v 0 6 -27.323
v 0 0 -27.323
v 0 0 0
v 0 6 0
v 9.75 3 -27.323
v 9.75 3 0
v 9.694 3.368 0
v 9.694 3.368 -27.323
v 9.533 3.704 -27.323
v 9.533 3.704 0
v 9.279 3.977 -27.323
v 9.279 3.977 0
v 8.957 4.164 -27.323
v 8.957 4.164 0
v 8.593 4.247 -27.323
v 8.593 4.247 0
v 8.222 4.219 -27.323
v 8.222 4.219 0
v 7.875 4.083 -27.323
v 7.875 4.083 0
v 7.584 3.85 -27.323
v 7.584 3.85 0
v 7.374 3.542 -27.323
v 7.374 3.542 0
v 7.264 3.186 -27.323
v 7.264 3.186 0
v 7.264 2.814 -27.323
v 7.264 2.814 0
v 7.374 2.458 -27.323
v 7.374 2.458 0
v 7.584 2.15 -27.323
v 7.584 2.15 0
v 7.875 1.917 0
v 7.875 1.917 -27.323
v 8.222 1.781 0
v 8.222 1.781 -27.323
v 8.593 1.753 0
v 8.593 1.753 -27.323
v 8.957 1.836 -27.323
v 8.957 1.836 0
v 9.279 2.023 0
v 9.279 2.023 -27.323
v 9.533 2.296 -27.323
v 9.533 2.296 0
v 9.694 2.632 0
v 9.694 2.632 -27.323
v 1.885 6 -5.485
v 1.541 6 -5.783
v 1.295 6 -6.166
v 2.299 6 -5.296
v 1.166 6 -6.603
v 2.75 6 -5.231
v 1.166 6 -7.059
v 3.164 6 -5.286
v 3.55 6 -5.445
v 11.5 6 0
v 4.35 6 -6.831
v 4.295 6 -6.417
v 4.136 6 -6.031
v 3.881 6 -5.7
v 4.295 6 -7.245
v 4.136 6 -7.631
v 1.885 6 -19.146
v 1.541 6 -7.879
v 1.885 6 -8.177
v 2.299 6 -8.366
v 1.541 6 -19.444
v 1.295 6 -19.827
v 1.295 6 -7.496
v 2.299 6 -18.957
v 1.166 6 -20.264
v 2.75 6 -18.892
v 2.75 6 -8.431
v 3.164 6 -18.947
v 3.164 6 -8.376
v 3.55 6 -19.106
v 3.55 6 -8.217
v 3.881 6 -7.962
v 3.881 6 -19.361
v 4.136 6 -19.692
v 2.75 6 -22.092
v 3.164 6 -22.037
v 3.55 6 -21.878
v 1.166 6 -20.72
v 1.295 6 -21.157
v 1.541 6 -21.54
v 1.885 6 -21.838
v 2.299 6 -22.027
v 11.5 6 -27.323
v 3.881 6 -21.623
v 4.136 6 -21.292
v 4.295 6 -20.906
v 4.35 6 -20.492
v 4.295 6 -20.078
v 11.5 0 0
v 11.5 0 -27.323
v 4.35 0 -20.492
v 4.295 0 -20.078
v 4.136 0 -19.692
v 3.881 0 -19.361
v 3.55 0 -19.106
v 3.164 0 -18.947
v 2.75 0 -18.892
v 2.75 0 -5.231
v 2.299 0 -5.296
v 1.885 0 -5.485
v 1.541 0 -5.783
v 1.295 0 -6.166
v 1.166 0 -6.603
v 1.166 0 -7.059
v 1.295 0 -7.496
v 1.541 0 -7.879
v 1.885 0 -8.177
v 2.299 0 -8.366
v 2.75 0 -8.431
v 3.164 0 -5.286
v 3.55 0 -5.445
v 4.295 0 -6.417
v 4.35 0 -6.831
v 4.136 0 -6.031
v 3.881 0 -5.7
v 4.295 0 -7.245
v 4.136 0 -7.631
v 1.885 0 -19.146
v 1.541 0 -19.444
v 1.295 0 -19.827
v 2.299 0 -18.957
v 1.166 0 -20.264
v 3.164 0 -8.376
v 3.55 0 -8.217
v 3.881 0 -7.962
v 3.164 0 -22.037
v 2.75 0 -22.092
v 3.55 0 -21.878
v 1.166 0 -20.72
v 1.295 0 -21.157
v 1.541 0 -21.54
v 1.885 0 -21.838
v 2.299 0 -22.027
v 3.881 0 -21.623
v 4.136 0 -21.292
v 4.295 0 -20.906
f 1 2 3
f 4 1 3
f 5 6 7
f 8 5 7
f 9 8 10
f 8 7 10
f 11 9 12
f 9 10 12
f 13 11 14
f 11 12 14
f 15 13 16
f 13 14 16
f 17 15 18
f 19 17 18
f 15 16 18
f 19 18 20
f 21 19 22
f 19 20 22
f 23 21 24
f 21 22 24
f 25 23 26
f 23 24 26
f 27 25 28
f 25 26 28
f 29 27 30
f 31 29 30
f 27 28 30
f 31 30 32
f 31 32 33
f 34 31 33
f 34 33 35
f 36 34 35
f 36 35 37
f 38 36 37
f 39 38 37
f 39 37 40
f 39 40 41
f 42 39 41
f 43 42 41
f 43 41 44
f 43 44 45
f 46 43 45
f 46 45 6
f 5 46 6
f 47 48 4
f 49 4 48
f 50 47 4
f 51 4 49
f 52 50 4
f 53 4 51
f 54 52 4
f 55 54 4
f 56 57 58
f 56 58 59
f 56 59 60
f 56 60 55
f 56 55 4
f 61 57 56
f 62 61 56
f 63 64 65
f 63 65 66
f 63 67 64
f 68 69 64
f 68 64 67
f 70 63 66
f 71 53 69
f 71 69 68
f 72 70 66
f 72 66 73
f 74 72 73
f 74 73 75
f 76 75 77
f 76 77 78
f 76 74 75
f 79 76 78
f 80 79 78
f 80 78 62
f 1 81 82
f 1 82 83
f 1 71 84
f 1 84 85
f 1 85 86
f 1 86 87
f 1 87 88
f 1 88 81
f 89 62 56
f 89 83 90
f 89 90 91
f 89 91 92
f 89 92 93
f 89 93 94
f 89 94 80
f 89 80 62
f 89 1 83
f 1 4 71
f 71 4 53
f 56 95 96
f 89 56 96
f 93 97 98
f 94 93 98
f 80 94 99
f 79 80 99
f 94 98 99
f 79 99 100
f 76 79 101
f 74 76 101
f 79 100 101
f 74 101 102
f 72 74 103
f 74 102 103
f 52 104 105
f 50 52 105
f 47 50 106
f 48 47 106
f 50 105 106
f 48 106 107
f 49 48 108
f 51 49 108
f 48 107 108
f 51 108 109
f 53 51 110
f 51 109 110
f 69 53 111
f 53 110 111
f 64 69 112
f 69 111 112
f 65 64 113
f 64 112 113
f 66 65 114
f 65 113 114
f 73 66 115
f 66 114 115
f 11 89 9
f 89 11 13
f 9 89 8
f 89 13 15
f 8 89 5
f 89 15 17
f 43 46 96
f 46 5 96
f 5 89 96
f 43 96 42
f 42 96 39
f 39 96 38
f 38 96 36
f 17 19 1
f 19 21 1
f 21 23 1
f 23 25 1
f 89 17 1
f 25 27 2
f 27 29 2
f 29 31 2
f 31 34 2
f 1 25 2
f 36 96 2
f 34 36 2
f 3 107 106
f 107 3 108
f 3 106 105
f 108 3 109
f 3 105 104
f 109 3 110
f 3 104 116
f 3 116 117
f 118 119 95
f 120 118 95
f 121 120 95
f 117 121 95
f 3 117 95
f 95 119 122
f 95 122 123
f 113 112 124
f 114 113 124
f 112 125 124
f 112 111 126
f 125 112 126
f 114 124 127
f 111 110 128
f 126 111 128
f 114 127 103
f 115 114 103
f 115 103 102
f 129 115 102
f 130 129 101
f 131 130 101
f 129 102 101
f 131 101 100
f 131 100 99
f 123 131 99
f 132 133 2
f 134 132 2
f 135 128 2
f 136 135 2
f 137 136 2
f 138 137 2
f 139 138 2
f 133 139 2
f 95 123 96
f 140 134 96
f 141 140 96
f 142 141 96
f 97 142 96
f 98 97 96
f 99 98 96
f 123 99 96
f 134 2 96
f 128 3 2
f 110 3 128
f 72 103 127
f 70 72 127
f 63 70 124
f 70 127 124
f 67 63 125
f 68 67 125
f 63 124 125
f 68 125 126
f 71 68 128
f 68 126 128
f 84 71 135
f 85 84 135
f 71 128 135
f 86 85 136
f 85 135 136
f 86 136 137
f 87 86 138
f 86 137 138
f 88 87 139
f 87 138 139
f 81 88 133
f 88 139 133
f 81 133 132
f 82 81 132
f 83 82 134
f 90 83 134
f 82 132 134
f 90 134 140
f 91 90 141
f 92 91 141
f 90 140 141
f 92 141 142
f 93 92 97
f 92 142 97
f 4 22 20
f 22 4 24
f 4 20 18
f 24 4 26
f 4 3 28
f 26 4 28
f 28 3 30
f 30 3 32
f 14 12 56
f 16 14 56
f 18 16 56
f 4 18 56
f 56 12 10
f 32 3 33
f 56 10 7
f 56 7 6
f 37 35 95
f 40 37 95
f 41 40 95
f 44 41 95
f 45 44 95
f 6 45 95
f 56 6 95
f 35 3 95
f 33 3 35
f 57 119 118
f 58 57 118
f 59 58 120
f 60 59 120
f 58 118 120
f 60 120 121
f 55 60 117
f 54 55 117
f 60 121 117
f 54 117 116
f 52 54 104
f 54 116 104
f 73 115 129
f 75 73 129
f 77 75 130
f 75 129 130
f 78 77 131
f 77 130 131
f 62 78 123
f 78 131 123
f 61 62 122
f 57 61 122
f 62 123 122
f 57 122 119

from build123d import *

# Parameters (mm, degrees)
BOSS_EXTRUDE1_DEPTH = 6
SKETCH2_R           = 1.25
CUT_EXTRUDE1_DEPTH  = 31.245600159


with BuildPart() as part:
    # Sketch1 → Boss-Extrude1 (new body)
    with BuildSketch(Plane(origin=(0, 0, 0), x_dir=(1, 0, 0), z_dir=(0, 1, 0))):
        with BuildLine():
            Line((5.5, 27.323), (2.75, 27.323))
            Line((2.75, 27.323), (2.75, 22.092))
            ThreePointArc((2.75, 22.092), (3.88137085, 21.62337085), (4.35, 20.492))
            ThreePointArc((4.35, 20.492), (3.88137085, 19.36062915), (2.75, 18.892))
            Line((2.75, 18.892), (2.75, 13.6615))
            Line((2.75, 13.6615), (2.75, 8.431))
            ThreePointArc((2.75, 8.431), (3.88137085, 7.96237085), (4.35, 6.831))
            ThreePointArc((4.35, 6.831), (3.88137085, 5.69962915), (2.75, 5.231))
            Line((2.75, 5.231), (2.75, 0))
            Line((2.75, 0), (11.5, 0))
            Line((11.5, 0), (11.5, 27.323))
            Line((11.5, 27.323), (5.5, 27.323))
        make_face()
        with BuildLine():
            Line((2.75, 27.323), (0, 27.323))
            Line((0, 27.323), (0, 0))
            Line((0, 0), (2.75, 0))
            Line((2.75, 0), (2.75, 5.231))
            ThreePointArc((2.75, 5.231), (1.15, 6.831), (2.75, 8.431))
            Line((2.75, 8.431), (2.75, 13.6615))
            Line((2.75, 13.6615), (2.75, 18.892))
            ThreePointArc((2.75, 18.892), (1.15, 20.492), (2.75, 22.092))
            Line((2.75, 22.092), (2.75, 27.323))
        make_face()
    extrude(amount=BOSS_EXTRUDE1_DEPTH)

    # Sketch2 → Cut-Extrude1 (cut, through all)
    with BuildSketch(Plane.XY):
        with Locations((8.5, 3)):
            Circle(SKETCH2_R)
    extrude(amount=-CUT_EXTRUDE1_DEPTH, mode=Mode.SUBTRACT)


solid = part.part
